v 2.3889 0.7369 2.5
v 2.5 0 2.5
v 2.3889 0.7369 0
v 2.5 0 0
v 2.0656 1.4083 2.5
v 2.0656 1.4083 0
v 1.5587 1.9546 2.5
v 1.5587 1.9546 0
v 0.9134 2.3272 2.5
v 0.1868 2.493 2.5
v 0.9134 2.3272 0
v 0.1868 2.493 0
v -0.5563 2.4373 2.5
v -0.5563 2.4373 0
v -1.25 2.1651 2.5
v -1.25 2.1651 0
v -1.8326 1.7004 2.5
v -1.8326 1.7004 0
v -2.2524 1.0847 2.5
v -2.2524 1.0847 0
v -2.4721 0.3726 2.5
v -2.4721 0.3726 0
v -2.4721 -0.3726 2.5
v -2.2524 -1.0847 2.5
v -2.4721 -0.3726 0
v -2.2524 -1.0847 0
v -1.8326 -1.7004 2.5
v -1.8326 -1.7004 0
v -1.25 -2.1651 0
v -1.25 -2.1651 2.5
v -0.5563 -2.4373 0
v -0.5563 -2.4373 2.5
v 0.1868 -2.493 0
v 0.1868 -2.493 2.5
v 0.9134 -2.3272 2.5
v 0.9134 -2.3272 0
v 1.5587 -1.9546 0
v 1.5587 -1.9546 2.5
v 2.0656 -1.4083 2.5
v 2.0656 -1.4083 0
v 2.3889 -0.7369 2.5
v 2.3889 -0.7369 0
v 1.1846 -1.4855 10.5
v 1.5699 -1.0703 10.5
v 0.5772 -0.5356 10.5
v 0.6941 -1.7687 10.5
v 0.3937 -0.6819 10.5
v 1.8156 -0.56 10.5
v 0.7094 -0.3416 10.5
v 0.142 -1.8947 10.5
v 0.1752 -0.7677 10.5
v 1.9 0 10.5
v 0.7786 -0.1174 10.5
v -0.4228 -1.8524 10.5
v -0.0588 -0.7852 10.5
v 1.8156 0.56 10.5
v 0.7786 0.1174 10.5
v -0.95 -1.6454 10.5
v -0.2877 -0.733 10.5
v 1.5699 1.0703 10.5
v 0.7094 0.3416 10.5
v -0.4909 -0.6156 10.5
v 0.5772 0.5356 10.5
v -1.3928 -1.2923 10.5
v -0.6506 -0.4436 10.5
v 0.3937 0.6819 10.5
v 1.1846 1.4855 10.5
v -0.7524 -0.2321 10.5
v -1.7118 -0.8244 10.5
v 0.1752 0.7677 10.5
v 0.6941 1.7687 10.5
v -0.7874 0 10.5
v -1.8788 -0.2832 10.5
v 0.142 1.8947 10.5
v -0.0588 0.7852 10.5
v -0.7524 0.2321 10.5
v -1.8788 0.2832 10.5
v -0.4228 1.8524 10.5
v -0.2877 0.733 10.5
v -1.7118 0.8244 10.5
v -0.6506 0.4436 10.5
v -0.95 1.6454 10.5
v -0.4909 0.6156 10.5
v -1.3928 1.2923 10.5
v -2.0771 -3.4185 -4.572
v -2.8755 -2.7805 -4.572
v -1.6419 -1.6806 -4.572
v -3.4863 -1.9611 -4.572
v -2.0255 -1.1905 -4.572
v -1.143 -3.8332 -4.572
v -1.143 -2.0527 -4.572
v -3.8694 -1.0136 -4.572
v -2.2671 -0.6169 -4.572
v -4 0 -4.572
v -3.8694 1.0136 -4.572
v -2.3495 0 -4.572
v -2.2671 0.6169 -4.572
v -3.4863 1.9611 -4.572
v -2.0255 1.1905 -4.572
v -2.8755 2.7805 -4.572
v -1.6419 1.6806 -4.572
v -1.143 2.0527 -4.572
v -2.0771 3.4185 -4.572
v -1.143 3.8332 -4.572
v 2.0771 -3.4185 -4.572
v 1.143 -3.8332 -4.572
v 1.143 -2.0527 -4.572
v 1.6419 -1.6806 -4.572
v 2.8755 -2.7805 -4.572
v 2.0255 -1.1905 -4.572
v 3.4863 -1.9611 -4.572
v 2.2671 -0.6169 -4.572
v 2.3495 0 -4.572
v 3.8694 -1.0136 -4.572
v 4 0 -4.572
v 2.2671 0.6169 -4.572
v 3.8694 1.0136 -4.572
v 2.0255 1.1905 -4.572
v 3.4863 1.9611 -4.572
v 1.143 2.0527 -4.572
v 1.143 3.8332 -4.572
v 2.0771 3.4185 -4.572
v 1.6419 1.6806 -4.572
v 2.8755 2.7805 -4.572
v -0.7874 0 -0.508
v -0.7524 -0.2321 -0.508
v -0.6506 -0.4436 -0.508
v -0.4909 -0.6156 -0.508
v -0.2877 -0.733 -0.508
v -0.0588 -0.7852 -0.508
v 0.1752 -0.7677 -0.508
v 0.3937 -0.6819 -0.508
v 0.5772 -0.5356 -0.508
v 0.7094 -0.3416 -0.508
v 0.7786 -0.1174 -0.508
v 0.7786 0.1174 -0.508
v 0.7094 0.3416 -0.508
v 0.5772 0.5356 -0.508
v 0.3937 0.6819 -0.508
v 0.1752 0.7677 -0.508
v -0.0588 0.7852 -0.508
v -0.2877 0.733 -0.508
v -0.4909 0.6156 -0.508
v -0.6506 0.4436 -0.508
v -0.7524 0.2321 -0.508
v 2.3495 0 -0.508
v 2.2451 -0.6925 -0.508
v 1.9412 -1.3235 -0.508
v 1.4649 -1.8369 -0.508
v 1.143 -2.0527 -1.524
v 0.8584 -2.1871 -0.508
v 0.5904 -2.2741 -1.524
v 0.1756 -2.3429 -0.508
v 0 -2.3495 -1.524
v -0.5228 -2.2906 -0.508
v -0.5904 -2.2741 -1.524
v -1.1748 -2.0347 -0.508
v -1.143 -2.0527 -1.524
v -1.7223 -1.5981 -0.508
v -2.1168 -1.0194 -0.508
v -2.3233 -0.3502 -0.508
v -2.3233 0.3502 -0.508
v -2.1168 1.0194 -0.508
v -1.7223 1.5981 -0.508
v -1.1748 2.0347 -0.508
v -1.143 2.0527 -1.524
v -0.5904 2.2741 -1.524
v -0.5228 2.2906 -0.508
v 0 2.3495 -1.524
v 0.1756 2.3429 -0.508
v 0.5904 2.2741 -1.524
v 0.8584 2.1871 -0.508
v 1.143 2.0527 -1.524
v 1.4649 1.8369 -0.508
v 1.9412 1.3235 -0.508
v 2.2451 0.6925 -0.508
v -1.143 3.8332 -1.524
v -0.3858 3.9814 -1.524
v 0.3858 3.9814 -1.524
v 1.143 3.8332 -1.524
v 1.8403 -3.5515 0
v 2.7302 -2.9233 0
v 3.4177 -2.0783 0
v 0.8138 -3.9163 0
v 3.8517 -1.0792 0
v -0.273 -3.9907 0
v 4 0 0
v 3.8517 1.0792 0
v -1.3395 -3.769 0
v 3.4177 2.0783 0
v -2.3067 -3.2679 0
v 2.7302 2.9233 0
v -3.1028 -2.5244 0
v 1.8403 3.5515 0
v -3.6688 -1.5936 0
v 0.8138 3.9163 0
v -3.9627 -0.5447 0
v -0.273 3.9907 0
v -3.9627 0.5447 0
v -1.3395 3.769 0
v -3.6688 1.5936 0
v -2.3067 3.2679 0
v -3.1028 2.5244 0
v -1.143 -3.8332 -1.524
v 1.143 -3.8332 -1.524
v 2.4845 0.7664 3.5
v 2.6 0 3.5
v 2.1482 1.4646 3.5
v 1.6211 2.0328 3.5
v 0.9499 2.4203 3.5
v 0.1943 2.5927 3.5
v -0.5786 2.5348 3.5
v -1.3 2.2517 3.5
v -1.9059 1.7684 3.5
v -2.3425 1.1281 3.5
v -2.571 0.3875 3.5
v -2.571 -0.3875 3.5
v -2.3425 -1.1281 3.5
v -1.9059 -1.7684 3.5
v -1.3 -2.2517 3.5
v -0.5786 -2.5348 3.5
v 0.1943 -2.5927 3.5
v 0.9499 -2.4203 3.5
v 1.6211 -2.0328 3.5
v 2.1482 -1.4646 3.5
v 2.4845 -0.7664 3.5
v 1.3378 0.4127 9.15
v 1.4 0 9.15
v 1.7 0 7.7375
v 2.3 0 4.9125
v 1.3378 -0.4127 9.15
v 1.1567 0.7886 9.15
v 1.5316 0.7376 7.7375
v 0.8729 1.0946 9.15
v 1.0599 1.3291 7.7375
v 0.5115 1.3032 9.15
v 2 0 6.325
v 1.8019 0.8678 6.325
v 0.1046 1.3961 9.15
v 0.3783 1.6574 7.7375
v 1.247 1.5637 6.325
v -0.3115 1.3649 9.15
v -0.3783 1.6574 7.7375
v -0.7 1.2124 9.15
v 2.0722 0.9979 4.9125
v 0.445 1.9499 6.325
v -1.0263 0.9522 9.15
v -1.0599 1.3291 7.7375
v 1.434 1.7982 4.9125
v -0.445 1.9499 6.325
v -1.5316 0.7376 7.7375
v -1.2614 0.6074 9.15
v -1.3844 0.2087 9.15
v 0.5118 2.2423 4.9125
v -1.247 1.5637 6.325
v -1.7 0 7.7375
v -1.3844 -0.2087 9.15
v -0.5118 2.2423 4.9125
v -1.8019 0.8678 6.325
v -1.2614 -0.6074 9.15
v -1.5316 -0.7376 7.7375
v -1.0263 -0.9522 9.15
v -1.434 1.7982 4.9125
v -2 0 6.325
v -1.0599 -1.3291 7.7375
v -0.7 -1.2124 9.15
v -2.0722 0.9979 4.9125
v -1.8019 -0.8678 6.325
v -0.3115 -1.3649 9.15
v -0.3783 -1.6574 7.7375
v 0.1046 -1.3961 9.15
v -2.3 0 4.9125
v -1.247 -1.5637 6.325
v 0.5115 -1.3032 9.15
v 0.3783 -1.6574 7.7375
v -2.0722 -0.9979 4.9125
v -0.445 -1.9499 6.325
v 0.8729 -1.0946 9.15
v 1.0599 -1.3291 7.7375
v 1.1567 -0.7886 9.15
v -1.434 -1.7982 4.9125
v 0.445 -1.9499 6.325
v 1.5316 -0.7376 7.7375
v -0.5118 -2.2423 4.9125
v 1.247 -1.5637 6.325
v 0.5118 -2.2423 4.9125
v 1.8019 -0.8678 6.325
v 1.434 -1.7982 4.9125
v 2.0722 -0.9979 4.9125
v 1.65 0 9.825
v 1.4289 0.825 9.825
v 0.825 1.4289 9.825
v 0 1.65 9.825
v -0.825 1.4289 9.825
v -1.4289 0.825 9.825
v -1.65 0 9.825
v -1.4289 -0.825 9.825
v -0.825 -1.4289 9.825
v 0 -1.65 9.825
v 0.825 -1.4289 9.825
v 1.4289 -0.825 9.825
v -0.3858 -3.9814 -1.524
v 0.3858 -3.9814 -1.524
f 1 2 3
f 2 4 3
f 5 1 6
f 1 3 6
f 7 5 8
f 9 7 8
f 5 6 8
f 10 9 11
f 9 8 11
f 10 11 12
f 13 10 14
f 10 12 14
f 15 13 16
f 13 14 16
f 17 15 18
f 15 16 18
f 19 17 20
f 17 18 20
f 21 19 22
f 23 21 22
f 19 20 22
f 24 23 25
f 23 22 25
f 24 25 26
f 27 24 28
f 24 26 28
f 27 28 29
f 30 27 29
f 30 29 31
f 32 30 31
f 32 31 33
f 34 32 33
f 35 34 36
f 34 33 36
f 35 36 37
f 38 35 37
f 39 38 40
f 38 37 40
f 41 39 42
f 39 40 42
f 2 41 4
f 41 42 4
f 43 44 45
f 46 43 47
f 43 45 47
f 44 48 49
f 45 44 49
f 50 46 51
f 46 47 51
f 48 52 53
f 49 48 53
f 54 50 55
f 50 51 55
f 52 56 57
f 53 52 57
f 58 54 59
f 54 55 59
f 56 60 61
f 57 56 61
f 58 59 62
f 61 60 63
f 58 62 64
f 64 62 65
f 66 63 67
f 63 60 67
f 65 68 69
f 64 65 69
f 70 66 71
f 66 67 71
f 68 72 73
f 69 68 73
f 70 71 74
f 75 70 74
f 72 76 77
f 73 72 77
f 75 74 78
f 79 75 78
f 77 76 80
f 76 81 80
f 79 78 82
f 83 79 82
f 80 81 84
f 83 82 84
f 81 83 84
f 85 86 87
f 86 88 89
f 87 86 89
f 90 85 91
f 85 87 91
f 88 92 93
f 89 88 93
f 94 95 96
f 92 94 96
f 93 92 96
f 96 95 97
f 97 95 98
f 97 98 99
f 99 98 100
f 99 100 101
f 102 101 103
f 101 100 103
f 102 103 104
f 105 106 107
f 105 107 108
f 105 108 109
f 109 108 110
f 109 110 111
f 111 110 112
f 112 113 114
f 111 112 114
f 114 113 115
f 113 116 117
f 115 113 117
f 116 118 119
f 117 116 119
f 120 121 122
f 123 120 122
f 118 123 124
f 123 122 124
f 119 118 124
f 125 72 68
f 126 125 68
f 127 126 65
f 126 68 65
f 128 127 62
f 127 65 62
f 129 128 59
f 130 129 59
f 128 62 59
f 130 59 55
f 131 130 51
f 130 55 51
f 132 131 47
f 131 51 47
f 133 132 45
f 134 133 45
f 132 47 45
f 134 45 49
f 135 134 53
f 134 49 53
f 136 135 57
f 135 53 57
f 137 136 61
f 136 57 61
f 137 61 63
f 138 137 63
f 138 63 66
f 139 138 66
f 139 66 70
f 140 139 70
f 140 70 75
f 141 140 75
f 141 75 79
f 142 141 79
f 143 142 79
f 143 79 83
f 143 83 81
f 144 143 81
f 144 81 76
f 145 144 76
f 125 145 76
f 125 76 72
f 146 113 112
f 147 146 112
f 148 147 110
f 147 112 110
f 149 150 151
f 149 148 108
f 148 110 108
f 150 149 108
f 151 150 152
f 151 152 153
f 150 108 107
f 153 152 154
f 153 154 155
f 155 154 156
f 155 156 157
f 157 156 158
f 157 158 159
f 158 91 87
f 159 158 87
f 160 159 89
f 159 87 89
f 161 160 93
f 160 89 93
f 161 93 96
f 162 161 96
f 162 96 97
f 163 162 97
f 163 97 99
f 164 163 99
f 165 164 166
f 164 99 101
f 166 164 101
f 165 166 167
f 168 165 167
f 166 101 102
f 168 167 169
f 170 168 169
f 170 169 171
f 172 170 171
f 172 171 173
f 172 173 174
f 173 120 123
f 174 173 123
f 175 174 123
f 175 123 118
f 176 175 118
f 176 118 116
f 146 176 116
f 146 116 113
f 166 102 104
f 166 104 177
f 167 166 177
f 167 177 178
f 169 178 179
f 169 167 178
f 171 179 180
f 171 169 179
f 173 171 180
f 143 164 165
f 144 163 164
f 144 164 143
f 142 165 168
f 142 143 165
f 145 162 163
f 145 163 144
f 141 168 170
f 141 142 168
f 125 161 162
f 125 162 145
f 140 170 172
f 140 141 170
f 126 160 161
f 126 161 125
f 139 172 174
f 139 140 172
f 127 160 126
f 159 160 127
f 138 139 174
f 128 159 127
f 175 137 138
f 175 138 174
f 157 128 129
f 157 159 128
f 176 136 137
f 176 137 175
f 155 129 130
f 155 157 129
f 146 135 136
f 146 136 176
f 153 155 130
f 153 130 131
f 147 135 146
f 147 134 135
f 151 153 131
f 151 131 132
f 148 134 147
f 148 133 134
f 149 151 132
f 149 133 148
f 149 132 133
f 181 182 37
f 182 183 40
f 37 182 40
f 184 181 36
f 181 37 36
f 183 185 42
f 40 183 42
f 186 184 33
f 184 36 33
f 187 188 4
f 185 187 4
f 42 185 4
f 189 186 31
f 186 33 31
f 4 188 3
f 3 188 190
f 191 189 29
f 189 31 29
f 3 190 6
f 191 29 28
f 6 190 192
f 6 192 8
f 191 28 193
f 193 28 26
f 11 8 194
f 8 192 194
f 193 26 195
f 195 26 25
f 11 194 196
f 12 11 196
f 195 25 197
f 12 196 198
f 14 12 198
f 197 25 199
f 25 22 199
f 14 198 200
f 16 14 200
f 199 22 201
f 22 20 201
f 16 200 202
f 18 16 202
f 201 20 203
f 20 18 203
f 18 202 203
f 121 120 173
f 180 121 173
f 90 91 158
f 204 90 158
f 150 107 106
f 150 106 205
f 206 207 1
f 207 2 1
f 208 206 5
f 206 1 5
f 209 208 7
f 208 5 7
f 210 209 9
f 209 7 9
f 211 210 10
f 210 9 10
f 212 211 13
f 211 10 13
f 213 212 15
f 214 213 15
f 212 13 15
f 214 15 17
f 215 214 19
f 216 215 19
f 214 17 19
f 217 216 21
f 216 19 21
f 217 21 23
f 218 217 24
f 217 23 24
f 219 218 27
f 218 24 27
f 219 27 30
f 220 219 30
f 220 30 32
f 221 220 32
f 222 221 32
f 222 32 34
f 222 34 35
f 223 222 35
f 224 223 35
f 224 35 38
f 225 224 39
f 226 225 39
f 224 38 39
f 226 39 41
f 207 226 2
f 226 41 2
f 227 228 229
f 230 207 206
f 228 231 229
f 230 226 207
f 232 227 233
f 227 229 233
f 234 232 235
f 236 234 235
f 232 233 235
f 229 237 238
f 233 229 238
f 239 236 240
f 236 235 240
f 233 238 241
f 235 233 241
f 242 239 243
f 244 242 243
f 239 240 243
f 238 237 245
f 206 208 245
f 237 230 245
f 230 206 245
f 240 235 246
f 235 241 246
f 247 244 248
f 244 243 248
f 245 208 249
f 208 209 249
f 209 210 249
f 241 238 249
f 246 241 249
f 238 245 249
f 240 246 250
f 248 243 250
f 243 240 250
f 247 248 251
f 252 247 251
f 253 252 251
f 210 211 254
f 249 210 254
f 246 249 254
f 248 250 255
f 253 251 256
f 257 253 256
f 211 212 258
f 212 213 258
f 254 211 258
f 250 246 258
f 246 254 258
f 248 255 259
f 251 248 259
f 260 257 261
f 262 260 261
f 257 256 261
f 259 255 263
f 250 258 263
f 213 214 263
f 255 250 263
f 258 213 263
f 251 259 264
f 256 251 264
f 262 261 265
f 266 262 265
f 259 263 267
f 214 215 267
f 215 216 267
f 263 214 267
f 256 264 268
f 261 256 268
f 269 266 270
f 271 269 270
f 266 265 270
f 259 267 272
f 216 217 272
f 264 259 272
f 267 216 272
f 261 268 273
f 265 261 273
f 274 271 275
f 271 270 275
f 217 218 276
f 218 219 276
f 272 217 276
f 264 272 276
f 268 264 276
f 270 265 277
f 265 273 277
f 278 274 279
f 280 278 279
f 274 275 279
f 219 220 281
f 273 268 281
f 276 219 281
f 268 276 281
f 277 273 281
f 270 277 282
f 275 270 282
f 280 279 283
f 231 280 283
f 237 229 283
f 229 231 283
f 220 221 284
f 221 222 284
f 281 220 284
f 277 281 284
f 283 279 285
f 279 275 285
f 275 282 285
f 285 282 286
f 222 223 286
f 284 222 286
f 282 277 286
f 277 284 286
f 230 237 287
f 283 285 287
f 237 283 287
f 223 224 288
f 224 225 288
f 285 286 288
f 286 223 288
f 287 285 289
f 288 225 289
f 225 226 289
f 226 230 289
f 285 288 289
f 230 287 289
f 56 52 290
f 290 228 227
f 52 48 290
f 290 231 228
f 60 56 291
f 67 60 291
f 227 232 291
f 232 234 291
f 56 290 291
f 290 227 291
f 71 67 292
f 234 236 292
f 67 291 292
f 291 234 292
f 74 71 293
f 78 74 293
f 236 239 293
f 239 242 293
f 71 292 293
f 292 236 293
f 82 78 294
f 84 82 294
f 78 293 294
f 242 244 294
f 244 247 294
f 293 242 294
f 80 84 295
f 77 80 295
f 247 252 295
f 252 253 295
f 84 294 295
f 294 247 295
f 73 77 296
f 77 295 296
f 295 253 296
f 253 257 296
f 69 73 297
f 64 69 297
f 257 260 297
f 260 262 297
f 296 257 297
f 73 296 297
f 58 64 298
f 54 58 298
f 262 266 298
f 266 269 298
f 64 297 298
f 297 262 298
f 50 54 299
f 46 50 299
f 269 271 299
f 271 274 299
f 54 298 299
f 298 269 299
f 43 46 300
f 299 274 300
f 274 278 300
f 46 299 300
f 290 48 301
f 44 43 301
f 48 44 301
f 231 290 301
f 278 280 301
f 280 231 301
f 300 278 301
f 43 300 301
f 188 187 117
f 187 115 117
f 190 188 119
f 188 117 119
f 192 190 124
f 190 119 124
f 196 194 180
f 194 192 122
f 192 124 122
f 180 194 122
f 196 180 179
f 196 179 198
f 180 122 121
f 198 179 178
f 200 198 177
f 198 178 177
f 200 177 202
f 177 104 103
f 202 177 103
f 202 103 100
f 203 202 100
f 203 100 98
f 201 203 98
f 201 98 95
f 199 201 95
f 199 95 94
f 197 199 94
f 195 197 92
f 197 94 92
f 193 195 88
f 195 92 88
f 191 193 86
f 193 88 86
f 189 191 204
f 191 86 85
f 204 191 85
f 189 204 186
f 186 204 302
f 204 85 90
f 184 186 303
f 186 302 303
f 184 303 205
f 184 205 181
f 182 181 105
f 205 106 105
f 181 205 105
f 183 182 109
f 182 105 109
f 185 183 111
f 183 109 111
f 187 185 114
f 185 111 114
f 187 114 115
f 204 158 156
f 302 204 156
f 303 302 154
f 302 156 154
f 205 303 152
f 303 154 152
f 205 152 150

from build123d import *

# Parameters (mm, degrees)
SKETCH001_R          = 2.3495
POCKET_DEPTH         = 4.064
SKETCH002_R          = 0.7874
POCKET001_DEPTH      = 15.073
SKETCH003_W          = 2.286
SKETCH003_H          = 5.08
POCKET002_DEPTH      = 5.0038
POCKET002_DEPTH_BACK = -99.9998


with BuildPart() as part:
    # Sketch → Revolution (revolve)
    with BuildSketch(Plane.XZ):
        Polygon((2.5, 0), (4, 0), (4, -4.572), (0, -4.572), (0, 0), (0, 10.5), (1.9, 10.5), (1.4, 9.15), (2.6, 3.5), (2.5, 2.5), align=None)
    revolve(axis=Axis((0, 0, 0), (0, 0, 1)))

    # Sketch001 (on Face5 of Revolution) → Pocket (cut)
    with BuildSketch(Plane(origin=(0, 0, -4.572), x_dir=(1, 0, 0), z_dir=(0, 0, -1))):
        Circle(SKETCH001_R)
    extrude(amount=-POCKET_DEPTH, mode=Mode.SUBTRACT)

    # Sketch002 (on Face6 of Pocket) → Pocket001 (cut, through all)
    with BuildSketch(Plane(origin=(0, 0, 10.5), x_dir=(-1, 0, 0), z_dir=(0, 0, 1))):
        Circle(SKETCH002_R)
    extrude(amount=-POCKET001_DEPTH, mode=Mode.SUBTRACT)

    # Sketch003 → Pocket002 (cut, two sides)
    with BuildSketch(Plane.XZ) as pocket002_sk:
        with Locations((0, -4.064)):
            Rectangle(SKETCH003_W, SKETCH003_H)
    extrude(amount=-POCKET002_DEPTH, mode=Mode.SUBTRACT)
    extrude(pocket002_sk.sketch, amount=-POCKET002_DEPTH_BACK, mode=Mode.SUBTRACT)


solid = part.part
